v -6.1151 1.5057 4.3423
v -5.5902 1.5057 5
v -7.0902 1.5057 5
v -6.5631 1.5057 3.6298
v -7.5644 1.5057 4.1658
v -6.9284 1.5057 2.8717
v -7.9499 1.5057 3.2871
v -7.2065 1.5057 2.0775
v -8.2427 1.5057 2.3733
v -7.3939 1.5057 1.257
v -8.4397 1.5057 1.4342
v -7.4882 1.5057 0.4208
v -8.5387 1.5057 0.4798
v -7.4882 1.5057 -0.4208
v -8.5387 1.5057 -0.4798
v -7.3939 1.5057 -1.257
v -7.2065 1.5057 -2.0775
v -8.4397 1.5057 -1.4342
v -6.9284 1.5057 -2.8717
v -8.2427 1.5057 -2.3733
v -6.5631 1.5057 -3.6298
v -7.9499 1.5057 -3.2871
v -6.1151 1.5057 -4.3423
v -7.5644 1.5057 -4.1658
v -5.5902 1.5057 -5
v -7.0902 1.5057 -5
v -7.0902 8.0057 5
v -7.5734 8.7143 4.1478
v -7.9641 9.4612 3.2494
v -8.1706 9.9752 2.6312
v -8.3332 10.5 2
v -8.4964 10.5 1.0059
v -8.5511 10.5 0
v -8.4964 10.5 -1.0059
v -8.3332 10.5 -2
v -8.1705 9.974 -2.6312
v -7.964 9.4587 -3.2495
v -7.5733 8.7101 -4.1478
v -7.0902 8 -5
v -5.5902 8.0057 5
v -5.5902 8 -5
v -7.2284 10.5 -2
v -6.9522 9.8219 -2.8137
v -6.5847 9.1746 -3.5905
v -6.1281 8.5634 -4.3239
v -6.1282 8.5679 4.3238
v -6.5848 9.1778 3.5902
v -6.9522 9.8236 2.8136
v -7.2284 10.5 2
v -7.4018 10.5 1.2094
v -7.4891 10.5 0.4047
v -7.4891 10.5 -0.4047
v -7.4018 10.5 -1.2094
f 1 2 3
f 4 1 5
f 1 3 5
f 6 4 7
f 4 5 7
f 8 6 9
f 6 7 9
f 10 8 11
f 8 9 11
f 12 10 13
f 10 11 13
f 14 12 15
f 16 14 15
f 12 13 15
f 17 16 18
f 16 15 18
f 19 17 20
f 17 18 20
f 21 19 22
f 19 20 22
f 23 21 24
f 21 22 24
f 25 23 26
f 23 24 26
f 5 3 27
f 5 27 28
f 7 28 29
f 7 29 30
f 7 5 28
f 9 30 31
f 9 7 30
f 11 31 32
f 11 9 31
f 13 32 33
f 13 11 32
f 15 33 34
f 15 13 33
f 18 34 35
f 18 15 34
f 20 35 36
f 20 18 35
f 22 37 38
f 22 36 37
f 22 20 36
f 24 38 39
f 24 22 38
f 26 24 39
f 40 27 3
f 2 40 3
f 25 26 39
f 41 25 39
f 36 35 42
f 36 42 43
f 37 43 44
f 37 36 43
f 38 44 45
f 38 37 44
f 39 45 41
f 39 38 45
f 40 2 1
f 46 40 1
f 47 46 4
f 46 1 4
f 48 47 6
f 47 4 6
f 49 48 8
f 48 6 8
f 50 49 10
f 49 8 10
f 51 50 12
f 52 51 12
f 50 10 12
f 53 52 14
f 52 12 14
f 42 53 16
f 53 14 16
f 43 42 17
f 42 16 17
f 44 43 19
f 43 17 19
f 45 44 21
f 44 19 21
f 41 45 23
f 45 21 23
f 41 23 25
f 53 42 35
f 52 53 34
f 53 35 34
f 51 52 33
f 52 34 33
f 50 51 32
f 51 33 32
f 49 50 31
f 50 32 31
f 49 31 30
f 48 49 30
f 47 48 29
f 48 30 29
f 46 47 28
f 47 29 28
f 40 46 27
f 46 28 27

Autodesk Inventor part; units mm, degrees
ref_plane "YZ Plane" through (0, 0, 0) normal (1, 0, 0) x (0, 1, 0)
ref_plane "XZ Plane" through (0, 0, 0) normal (0, 1, 0) x (-1, 0, 0)
ref_plane "XY Plane" through (0, 0, 0) normal (0, 0, 1) x (1, 0, 0)
sketch "Sketch1" plane through (0, 0, 0) normal (0, 1, 0) x (-1, 0, 0)
  arc A0 (0, -7.5) -> (0, 7.5) centre (0, 0) ccw
  line L0 (0, 7.5) -> (0, -7.5)
  dimension "d0" = 15
extrude "Extrusion1" add sketch "Sketch1" along normal blind 12
ref_plane "Work Plane1" through (-10, 0, 7.5) normal (1, 0, 0) x (0, 0, -1)
sketch "Sketch2" plane through (-10, 0, 7.5) normal (1, 0, 0) x (0, 0, -1)
  line L0 (2.5, 8.0057) -> (2.5, 1.5057)
  line L1 (2.5, 1.5057) -> (12.5, 1.5057)
  line L2 (12.5, 1.5057) -> (12.5, 8)
  line L3 (9.5, 10.5) -> (5.5, 10.5)
  line L4 (9.5, 10.5) -> (12.5, 8)
  line L5 (5.5, 10.5) -> (2.5, 8.0057)
  line L6 (15, 0) -> (15, 12) projected
  point P0 (7.5, 0)
  dimension "d9" = 10
  dimension "d10" = 6.5
  dimension "d12" = 4
  dimension "d14" = 3
  dimension "d15" = 3
  dimension "d24" = 2.5
extrude "Extrusion2" add sketch "Sketch2" along normal blind 10
sketch "Sketch5" plane through (0, 0, 0) normal (0, 1, 0) x (-1, 0, 0)
  arc A0 (0, -7.5) -> (0, 7.5) centre (0, 0) ccw
  arc A1 (0, -7.5) -> (0, 7.5) centre (0, 0) ccw projected
  line L0 (0, 7.5) -> (0, -7.5)
  line L1 (0, -7.5) -> (0, 7.5)
extrude "Extrusion5" cut sketch "Sketch5" along normal through all both and the other way through all
sketch "Sketch6" plane through (0, 0, 0) normal (0, 1, 0) x (-1, 0, 0)
  line L0 (7.0902, 5) -> (5.5902, 5)
  arc A0 (7.0902, -5) -> (7.0902, 5) centre (12.3734, 0) ccw
  arc A1 (7.0902, -5) -> (7.0902, 5) centre (-0.7358, 0) ccw
  point P0 (0, 0)
extrude "Extrusion6" cut sketch "Sketch6" along normal through all both and the other way through all
properties part number "15mm_radius_mold_with_crystal_skull"
